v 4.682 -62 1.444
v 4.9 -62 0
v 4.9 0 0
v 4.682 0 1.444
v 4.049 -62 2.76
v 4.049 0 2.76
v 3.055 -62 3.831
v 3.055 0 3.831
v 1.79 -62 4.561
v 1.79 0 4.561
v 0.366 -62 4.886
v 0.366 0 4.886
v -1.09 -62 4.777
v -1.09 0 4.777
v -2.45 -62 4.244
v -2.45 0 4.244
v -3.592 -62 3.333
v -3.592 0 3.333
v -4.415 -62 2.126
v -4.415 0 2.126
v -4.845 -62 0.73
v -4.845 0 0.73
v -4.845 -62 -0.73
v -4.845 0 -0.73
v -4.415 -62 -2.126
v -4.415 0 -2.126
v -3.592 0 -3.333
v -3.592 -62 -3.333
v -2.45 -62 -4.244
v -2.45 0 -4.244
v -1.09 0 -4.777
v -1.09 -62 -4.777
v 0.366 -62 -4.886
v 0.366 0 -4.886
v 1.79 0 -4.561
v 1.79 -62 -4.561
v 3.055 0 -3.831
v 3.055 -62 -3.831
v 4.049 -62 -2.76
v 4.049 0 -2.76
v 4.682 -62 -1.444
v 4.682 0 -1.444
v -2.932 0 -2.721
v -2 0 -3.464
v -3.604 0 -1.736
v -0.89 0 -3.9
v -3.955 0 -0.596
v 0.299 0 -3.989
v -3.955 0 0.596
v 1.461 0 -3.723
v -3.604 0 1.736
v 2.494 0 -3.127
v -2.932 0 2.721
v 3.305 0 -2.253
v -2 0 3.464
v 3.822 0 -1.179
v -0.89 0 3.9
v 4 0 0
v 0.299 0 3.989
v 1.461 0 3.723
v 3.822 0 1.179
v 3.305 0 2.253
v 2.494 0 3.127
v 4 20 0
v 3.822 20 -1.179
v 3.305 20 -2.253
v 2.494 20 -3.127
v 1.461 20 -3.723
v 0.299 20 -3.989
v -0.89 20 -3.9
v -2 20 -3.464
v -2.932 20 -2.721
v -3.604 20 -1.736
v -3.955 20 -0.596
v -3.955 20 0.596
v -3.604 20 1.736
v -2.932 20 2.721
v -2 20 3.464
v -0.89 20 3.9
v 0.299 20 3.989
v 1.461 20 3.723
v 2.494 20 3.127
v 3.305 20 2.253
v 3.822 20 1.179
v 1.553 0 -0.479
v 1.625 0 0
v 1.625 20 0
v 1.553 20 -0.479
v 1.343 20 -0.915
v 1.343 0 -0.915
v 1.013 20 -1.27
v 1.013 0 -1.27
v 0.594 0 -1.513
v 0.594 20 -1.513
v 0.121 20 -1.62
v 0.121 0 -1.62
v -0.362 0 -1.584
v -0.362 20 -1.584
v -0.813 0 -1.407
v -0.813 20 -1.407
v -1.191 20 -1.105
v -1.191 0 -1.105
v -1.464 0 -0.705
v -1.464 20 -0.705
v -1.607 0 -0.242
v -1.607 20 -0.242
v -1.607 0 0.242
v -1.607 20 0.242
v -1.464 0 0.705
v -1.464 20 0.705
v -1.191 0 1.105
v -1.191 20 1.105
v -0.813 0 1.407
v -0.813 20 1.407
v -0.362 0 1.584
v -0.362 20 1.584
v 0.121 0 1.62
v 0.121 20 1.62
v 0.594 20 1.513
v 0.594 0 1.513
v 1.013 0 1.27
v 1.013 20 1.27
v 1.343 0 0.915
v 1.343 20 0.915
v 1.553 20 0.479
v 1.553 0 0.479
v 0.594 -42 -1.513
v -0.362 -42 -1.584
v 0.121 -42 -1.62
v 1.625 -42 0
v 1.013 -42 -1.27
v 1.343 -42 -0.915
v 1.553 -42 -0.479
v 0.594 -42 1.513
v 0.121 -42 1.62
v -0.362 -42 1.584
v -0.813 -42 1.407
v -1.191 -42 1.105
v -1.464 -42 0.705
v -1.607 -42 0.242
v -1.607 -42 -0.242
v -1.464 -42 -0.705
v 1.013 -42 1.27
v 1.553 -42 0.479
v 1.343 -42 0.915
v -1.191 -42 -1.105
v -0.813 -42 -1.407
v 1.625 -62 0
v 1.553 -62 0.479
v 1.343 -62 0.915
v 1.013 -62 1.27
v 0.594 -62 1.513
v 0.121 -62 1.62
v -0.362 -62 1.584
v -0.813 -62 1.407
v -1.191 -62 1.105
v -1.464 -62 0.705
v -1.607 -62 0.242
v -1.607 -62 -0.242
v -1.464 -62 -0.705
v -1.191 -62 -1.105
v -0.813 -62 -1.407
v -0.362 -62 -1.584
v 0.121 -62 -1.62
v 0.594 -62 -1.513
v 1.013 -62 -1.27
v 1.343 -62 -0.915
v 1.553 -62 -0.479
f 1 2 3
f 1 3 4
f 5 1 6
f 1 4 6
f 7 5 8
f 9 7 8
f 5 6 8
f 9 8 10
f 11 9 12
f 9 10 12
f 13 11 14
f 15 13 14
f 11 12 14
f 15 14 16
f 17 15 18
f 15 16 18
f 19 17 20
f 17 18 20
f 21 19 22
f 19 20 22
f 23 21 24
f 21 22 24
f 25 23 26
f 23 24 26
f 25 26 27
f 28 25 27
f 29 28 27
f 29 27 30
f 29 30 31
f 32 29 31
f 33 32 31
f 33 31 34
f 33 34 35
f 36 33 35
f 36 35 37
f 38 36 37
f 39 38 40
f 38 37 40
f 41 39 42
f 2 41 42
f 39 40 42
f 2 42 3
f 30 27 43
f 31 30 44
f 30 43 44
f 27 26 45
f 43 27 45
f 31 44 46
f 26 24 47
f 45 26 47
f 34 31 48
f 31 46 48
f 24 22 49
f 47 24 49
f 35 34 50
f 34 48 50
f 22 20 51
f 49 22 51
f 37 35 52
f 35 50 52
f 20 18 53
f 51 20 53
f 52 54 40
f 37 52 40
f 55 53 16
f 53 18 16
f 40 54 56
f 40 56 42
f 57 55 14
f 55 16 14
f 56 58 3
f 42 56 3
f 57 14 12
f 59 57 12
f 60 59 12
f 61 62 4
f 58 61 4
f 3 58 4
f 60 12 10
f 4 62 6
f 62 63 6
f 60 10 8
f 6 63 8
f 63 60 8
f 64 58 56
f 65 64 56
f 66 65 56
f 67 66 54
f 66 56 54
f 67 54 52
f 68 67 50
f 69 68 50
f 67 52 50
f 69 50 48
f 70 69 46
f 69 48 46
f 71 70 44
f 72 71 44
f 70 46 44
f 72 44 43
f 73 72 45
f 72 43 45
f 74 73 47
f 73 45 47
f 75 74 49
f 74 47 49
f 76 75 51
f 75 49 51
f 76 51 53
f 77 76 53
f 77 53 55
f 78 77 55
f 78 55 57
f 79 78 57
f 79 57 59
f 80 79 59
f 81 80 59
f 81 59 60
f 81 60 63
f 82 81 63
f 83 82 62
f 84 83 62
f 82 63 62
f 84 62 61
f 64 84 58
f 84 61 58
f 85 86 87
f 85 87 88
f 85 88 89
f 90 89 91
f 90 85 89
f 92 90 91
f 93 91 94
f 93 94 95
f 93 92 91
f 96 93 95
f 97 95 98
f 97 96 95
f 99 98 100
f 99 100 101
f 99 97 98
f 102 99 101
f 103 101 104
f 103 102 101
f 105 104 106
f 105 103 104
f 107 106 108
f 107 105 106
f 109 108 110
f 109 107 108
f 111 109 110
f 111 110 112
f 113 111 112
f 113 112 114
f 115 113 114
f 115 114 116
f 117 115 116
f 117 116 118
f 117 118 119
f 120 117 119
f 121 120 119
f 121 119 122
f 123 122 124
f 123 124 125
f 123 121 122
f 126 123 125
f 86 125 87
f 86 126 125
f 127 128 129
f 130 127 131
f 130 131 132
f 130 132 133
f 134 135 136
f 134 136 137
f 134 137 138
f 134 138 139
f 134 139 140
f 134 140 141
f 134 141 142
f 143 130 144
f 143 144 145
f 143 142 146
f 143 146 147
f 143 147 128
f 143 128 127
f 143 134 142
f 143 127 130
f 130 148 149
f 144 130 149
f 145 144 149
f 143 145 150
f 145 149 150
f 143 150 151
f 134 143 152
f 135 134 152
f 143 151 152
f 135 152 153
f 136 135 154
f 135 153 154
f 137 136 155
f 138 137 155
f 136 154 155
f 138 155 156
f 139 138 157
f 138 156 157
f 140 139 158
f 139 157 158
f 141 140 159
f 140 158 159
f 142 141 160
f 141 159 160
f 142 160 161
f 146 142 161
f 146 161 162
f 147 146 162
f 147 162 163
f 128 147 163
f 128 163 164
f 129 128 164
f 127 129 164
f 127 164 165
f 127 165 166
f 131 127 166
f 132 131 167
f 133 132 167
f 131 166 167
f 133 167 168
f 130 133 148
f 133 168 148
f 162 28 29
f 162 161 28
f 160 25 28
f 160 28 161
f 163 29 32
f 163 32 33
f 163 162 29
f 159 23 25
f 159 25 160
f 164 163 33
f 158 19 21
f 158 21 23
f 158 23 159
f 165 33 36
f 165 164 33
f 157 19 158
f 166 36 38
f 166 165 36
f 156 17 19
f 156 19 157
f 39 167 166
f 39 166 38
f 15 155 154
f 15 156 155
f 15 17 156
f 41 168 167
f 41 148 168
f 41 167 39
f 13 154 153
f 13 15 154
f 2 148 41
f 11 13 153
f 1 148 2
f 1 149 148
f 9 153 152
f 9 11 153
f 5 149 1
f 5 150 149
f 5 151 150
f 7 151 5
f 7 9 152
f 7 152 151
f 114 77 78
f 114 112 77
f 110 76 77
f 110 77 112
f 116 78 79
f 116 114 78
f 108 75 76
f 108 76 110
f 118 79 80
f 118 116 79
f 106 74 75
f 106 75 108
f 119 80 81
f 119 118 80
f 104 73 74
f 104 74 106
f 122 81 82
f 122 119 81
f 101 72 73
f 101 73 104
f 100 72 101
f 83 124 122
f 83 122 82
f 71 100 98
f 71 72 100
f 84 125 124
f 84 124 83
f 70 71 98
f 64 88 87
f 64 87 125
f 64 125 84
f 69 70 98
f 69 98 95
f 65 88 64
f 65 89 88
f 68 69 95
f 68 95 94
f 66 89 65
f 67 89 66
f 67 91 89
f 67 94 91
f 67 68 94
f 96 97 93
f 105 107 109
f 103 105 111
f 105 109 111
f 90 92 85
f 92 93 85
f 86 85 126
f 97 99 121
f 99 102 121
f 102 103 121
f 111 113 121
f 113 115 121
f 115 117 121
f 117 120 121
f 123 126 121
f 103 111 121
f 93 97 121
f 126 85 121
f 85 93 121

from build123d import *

# Parameters (mm, degrees)
SKETCH1_R           = 4
SKETCH1_R_2         = 1.625
BOSS_EXTRUDE2_DEPTH = 20
SKETCH2_R           = 4.9
BOSS_EXTRUDE3_DEPTH = 62
SKETCH6_R           = 1.625
CUT_EXTRUDE3_DEPTH  = 20


with BuildPart() as part:
    # Sketch1 → Boss-Extrude2 (new body)
    with BuildSketch(Plane(origin=(0, 0, 0), x_dir=(1, 0, 0), z_dir=(0, 1, 0))):
        Circle(SKETCH1_R)
        Circle(SKETCH1_R_2, mode=Mode.SUBTRACT)
    extrude(amount=BOSS_EXTRUDE2_DEPTH)

    # Sketch2 → Boss-Extrude3 (add)
    with BuildSketch(Plane.XZ):
        Circle(SKETCH2_R)
    extrude(amount=BOSS_EXTRUDE3_DEPTH)

    # Sketch6 → Cut-Extrude3 (cut)
    with BuildSketch(Plane.XZ.offset(62)):
        Circle(SKETCH6_R)
    extrude(amount=-CUT_EXTRUDE3_DEPTH, mode=Mode.SUBTRACT)


solid = part.part
